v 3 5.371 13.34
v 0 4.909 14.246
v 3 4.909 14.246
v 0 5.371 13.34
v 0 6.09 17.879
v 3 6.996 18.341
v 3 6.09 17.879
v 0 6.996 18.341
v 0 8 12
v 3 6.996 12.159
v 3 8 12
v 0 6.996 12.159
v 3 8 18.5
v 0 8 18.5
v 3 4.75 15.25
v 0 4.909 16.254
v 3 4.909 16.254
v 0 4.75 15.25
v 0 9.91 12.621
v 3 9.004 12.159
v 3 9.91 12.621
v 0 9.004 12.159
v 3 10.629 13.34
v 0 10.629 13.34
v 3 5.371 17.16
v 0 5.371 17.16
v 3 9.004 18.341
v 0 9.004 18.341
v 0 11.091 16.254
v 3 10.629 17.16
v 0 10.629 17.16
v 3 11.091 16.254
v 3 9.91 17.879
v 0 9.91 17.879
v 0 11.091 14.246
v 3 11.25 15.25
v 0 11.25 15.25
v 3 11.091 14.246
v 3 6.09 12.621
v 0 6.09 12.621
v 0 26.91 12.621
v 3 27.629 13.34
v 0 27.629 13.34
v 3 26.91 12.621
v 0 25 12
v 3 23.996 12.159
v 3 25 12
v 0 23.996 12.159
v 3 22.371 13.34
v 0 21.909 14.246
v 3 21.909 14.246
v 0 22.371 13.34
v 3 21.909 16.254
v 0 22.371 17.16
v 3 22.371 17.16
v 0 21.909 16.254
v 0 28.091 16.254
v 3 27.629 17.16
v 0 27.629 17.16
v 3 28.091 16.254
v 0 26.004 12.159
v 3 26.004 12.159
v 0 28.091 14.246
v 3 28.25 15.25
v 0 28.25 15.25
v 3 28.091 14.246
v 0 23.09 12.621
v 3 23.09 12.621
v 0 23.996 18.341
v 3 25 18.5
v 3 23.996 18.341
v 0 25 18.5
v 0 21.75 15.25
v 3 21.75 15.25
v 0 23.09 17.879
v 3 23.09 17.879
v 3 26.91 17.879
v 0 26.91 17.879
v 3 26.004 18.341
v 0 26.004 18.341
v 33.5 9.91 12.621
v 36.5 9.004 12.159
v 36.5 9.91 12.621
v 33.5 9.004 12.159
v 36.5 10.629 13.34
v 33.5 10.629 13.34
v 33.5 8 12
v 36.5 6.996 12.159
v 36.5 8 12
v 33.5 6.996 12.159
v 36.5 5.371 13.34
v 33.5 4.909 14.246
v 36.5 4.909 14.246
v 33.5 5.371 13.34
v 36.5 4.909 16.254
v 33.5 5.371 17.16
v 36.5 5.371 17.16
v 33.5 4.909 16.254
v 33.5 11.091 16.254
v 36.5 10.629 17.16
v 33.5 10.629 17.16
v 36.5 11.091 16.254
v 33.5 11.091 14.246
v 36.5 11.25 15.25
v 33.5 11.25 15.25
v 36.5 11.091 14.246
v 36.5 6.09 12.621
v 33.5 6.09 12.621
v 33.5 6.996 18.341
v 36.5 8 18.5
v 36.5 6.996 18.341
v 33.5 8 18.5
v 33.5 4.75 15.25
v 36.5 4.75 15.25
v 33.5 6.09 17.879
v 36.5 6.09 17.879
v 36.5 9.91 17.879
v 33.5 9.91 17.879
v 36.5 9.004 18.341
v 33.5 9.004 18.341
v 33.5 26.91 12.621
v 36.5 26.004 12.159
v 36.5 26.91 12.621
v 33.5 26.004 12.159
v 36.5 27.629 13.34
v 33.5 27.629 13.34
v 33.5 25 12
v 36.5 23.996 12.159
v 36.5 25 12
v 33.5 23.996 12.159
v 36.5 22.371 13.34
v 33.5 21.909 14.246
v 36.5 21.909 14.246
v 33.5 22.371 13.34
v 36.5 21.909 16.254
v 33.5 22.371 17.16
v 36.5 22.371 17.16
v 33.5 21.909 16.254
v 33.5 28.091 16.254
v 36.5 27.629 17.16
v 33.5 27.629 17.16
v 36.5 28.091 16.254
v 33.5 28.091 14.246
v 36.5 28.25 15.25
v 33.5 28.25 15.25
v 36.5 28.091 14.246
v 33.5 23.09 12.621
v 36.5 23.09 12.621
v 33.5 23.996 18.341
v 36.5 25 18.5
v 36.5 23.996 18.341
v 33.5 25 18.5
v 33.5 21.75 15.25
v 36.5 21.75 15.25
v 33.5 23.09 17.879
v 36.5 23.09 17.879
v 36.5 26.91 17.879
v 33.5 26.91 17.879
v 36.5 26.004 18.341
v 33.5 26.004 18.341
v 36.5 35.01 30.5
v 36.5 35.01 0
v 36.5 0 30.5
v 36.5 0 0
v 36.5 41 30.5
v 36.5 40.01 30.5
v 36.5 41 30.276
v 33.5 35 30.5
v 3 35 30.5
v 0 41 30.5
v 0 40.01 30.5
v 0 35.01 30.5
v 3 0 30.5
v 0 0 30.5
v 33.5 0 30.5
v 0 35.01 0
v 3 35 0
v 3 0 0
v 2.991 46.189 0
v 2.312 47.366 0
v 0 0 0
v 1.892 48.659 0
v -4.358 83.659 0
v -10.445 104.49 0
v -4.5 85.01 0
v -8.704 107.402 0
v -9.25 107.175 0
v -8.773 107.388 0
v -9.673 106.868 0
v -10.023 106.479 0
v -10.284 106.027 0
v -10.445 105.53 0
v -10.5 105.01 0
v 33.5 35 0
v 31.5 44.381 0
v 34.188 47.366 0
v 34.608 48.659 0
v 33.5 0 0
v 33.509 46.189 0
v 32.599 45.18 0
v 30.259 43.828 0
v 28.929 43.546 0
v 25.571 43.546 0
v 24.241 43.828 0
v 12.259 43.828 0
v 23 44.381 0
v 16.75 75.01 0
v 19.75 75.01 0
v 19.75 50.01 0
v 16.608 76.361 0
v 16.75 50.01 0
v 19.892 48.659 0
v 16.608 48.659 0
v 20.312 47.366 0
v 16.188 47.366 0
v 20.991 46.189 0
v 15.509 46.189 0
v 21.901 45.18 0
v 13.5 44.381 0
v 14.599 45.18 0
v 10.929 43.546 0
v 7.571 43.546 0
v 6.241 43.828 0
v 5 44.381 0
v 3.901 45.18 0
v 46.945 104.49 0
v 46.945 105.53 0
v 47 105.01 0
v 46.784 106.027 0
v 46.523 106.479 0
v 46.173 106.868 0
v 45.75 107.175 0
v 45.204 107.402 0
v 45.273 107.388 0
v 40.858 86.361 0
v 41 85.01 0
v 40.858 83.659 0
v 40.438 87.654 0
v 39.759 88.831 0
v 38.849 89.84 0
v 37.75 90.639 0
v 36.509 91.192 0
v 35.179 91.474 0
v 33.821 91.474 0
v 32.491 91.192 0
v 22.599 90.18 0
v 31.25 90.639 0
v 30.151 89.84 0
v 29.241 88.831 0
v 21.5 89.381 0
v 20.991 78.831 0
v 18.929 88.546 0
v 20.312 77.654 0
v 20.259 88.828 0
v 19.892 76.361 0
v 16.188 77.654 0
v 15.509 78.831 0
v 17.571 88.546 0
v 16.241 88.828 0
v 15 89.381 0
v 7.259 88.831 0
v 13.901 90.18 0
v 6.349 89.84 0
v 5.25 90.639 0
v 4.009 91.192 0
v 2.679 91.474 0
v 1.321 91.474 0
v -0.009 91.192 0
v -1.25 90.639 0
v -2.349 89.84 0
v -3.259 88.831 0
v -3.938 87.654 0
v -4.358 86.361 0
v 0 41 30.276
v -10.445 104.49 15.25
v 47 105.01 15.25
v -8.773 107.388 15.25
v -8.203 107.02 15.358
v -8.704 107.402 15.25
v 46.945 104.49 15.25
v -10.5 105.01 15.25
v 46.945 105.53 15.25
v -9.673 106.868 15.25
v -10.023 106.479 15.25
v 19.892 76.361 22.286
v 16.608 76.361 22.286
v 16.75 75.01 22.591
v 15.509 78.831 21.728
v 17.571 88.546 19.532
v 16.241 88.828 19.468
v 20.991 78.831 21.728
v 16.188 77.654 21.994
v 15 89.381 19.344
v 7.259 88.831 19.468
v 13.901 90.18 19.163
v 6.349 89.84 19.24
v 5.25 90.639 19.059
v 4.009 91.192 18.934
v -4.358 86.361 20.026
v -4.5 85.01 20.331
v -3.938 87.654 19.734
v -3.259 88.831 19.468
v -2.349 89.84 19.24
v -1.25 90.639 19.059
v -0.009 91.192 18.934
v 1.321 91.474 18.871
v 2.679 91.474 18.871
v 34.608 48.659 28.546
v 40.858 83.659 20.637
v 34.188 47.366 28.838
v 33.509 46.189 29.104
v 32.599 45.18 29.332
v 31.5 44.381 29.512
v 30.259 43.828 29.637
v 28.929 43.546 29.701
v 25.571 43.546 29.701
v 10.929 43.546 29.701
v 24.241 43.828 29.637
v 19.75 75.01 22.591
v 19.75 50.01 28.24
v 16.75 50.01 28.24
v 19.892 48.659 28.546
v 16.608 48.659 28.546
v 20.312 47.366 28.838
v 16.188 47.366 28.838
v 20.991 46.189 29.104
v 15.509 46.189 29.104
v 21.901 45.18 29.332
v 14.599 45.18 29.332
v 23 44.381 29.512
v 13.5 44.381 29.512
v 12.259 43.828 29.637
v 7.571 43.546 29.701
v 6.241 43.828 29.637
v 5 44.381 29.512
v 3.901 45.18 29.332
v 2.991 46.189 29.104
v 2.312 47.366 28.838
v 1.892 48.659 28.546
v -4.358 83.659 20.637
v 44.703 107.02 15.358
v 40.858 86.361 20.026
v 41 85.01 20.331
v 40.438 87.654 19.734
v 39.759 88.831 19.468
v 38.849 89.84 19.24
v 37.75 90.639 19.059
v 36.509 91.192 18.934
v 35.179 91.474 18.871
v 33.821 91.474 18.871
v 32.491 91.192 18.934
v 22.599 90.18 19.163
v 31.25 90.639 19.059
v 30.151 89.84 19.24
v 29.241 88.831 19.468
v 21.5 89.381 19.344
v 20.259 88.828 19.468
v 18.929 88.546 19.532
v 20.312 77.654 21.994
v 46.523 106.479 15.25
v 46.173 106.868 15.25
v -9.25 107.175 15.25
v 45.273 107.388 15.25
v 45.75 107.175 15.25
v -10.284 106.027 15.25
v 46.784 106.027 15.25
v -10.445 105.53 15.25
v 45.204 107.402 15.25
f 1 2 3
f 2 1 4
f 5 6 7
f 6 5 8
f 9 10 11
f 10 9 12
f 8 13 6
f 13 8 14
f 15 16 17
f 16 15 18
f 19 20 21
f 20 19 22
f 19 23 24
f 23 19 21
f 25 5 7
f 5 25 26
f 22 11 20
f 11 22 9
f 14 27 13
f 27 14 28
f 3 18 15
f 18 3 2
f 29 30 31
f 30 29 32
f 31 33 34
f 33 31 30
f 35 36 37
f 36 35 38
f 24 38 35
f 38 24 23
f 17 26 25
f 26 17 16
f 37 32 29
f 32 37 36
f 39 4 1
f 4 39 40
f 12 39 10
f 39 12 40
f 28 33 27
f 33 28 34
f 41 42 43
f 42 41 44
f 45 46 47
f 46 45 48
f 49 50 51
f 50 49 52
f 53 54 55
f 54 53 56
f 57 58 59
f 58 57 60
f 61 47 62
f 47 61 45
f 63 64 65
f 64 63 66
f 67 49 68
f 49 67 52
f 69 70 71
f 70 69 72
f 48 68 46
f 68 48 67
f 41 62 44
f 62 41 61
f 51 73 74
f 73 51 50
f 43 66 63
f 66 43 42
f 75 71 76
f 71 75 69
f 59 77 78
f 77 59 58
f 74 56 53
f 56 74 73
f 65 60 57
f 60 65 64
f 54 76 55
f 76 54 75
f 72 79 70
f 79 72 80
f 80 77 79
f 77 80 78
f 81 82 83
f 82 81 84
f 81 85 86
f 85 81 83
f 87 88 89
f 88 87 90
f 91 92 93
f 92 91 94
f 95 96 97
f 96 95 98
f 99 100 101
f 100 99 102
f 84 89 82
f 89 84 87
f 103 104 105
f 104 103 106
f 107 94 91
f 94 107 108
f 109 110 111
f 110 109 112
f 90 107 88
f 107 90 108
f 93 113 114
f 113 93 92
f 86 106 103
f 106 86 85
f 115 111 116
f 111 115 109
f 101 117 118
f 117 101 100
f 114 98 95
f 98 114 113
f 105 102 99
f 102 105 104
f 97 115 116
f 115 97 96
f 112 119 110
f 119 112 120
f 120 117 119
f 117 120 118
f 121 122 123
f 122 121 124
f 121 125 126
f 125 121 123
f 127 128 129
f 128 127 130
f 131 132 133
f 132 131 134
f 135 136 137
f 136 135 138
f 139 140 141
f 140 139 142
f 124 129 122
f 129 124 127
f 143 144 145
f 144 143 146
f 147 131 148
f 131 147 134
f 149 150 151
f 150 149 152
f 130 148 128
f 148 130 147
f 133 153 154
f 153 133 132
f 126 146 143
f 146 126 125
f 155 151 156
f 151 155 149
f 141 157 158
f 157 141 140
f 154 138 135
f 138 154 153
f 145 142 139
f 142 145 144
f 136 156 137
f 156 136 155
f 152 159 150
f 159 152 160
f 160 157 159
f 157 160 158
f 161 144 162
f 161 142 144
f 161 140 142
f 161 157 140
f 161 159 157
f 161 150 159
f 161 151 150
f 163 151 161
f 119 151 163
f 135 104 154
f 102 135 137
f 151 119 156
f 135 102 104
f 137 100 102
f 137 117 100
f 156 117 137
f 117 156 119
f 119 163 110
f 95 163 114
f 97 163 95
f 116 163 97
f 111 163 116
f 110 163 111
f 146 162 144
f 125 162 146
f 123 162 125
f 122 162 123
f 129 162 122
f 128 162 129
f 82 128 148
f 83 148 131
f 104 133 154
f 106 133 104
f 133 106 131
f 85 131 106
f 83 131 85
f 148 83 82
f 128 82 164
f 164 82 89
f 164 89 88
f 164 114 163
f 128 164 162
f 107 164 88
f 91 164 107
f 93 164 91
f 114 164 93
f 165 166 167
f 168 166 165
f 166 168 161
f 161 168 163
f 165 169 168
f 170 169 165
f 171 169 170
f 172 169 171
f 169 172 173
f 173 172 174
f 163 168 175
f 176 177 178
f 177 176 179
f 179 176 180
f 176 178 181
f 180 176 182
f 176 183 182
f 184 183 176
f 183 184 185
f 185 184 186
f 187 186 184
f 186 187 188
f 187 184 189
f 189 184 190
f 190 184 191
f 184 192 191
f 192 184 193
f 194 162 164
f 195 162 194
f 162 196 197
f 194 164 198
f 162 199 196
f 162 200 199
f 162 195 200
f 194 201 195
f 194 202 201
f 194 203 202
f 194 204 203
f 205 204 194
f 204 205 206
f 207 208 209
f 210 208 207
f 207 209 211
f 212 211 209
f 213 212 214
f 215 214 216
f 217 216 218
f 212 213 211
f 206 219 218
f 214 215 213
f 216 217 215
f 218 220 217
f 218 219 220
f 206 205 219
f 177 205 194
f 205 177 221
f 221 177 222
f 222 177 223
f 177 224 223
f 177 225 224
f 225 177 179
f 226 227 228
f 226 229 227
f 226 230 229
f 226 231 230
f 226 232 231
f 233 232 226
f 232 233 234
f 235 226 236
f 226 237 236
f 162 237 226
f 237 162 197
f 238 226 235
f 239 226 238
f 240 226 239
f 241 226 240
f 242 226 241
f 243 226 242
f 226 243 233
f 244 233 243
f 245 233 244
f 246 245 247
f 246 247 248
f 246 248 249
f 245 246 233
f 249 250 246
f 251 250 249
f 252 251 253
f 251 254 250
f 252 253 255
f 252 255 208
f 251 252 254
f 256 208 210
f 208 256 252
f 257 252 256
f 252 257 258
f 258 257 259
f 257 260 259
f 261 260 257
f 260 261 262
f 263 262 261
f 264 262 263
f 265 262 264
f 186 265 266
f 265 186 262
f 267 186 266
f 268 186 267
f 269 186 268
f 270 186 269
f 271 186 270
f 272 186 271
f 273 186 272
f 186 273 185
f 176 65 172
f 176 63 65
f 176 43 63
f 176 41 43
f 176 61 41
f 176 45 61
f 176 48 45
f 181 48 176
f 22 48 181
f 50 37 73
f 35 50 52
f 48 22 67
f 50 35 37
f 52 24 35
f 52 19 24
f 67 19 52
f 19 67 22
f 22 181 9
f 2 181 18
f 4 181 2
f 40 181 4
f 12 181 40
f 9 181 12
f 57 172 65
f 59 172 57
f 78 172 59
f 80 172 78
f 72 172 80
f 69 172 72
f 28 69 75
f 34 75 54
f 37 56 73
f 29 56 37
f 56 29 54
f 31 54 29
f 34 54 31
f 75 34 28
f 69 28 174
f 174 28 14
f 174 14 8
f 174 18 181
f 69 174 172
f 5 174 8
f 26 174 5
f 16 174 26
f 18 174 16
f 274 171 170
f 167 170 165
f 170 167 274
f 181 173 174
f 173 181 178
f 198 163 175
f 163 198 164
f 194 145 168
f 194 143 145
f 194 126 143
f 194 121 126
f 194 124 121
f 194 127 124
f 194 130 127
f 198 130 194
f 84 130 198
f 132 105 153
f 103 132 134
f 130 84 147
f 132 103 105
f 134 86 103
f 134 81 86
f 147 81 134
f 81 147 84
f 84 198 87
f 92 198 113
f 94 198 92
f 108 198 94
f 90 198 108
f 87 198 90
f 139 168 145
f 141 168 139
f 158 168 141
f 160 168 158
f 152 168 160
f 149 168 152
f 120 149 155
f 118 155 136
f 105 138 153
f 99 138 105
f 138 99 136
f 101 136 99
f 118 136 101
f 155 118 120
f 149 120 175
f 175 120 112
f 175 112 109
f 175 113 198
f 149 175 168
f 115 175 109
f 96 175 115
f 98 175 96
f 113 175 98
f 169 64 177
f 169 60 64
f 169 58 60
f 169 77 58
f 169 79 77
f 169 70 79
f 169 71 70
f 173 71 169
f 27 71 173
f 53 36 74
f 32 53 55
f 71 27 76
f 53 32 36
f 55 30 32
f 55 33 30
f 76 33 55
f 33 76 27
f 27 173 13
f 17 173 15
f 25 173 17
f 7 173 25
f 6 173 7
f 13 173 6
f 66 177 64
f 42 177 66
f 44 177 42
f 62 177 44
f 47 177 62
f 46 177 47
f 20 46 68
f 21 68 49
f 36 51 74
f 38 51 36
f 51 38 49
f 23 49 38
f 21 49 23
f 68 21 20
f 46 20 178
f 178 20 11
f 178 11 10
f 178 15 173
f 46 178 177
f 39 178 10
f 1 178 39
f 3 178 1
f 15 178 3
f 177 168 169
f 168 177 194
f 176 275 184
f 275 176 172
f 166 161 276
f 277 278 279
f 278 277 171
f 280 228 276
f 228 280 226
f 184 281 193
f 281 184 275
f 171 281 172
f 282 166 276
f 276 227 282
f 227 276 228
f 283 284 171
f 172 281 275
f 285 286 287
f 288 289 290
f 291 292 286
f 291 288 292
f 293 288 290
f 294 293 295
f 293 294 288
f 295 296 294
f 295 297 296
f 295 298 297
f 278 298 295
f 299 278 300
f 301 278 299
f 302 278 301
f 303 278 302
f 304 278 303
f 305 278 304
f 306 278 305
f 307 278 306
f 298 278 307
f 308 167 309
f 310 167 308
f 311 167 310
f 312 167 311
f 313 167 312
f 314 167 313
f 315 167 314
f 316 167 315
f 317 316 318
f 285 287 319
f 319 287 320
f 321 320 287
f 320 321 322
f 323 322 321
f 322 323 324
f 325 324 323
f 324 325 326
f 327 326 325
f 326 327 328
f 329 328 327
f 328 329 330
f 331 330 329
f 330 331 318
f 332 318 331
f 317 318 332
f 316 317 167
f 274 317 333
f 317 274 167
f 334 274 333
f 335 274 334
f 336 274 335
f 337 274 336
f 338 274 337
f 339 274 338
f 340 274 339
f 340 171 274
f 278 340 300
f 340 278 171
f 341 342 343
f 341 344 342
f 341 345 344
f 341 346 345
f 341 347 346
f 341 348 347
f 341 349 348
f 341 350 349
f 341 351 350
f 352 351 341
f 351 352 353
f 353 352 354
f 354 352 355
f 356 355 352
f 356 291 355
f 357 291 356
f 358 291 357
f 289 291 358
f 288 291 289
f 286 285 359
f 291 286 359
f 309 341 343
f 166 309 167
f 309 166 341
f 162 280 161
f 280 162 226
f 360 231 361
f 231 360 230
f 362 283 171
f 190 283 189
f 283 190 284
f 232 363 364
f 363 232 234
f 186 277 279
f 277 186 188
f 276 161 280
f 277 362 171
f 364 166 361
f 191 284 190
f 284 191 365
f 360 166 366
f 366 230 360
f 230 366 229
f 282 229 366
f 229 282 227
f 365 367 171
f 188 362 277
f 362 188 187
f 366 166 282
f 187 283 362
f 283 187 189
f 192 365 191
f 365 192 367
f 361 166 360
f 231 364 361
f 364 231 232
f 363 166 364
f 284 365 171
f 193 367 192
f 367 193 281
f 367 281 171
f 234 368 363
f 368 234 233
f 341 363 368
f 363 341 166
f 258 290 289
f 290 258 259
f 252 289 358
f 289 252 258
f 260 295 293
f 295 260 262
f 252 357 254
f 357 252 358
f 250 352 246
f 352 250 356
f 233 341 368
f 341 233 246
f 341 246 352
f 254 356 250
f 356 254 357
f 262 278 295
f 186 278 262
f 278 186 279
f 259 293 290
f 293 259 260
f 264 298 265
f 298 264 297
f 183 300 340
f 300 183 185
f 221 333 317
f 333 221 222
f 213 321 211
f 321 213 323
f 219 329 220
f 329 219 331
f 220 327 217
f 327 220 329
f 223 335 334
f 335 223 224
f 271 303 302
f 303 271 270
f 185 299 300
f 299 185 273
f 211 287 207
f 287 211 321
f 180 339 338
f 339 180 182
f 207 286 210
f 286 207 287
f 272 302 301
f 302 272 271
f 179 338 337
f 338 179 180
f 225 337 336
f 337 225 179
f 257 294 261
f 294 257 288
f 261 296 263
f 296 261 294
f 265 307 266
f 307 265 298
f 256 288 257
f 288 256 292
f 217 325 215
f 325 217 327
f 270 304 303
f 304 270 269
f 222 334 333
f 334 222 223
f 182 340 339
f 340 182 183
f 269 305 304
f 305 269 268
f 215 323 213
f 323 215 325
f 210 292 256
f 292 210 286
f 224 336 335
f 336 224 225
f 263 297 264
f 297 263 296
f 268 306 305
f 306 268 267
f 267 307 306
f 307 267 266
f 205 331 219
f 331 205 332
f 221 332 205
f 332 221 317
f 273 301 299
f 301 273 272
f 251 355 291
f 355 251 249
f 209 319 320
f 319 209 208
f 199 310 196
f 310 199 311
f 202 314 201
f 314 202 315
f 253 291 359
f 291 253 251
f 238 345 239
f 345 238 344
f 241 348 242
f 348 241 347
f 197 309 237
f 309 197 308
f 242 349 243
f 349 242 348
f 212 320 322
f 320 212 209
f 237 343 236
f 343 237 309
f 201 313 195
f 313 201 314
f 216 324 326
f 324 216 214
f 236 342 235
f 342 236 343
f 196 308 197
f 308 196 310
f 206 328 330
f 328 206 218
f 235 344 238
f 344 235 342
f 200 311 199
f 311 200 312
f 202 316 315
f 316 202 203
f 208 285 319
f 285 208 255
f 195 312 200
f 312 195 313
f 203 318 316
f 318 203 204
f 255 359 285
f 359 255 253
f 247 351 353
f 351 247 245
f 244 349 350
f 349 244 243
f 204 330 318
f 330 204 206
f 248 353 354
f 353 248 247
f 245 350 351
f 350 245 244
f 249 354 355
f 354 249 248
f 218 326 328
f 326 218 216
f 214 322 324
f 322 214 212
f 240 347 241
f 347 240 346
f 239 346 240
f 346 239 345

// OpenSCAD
// file: lib/ALU_profile_holder_top.scad
include <../../parameters.scad>



module ALU_profile_holder_top(deep=35) {
    wall_thickness = ALU_profile_holder_wall_thickness;
    
    module screw_holes() {
        translate([wall_thickness/2, 8, ALU_profile_width/2]) {
            rotate([0, 90, 0]) 
                cylinder(d=M6_screw_diameter, h=wall_thickness*2, center=true, $fn=20);
        }
        translate([wall_thickness/2, deep-10, ALU_profile_width/2]) {
                rotate([0, 90, 0])
                cylinder(d=M6_screw_diameter, h=wall_thickness*2, center=true, $fn=20);
            
        }
    }
    
    difference() {
        cube([ALU_profile_width+wall_thickness*2, deep+wall_thickness*2, ALU_profile_width]);
        translate([wall_thickness, -0.1, -0.1])
            cube([ALU_profile_width, deep+0.1, ALU_profile_width+0.2]);
        
        screw_holes();
        translate([ALU_profile_width+wall_thickness, 0, 0])
            screw_holes();
    }
}

ALU_profile_holder_top(35);
// file: ../parameters.scad
maximum_printable_size = 150;

layer_thickness = 0.3;
global_clearance = 0.5;


//Screw diameter and nut for M10 [mm]
M10_screw_diameter = 10.4;
M10_head_height = 10;
M10_head_diameter = 16+0.5;
M10_nut_height = 10.5;
M10_nut_diameter = 25.5;
M10_nut_pocket = 22.3;

//Screw diameter for M8 [mm]
M8_screw_diameter = 8.6;
M8_head_height = 8;
M8_head_diameter = 13.5;
M8_nut_height = 7.5;
M8_square_nut_thin_height = 4.5;
M8_nut_diameter = 14.4 + 0.5;
M8_nut_pocket = 13 + 0.5;
M8_washer_diameter = 16;
M8_washer_thickness = 1.5;


//Screw diameter and nut for M6 [mm]
M6_screw_diameter=6.5;
M6_head_diameter = 10+0.5;
M6_head_height = 6;
M6_nut_height = 4.9;
M6_nut_diameter = 11.8;
M6_nut_pocket = 10.4;
M6_square_nut_height = 3;
M6_square_nut_diameter = 10;
M6_washer_thickness = 1.6;

//Screw diameter and nut for M5 [mm]
M5_screw_diameter=5.5;
M5_head_height = 5;
M5_head_diameter = 13+0.5;
M5_nut_height = 4.5;
M5_nut_diameter = 9.4;
M5_nut_pocket = 8.4;

//Screw diameter and nut for M4 [mm]
M4_screw_diameter=4.5;
M4_screw_head_height = 4;
M4_nut_height = 3.2;
M4_nut_diameter = 8.4;
M4_nut_pocket = 7.5;

//Screw diameter and nut for M3 [mm]
M3_screw_diameter = 3.2;
M3_nut_height = 2.7;
M3_nut_diameter = 6.6;
M3_nut_pocket = 5.6;
M3_screw_head_height = 3;

//Screw diameter and nut for M2,5 [mm]
M2_5_screw_diameter = 2.7;
M2_5_nut_height = 2.3;
M2_5_nut_diameter = 6;
M2_5_nut_pocket = 5.5;

// kulove lozisko

bearing_efsm_08_h = 33+1;
bearing_efsm_08_m = 22;
bearing_efsm_08_db = 18;
bearing_efsm_08_ag = 10.5;
bearing_efsm_08_n = M4_screw_diameter;
bearing_efsm_08_a1 = 5.5;
bearing_efsm_08_d = 8.25;
bearing_efsm_08_B = 8; // ball height

bearing_efsm_10_h = 38+1;
bearing_efsm_10_m = 26;
bearing_efsm_10_db = 21.9;
bearing_efsm_10_ag = 12+0.2;
bearing_efsm_10_n = M5_screw_diameter;
bearing_efsm_10_a1 = 6.5;
bearing_efsm_10_d = 10.25;


bearing_efsm_12_width = 40+1;
bearing_efsm_12_h = bearing_efsm_12_width;
bearing_efsm_12_boltd = 28/2; // polovina vzdalenosti mezi srouby
bearing_efsm_12_m = bearing_efsm_12_boltd*2;
bearing_efsm_12_db = 25;
bearing_efsm_12_ag = 13;
bearing_efsm_12_a1 = 7;
bearing_efsm_12_n = M5_screw_diameter;
bearing_efsm_12_d = 12.15;
bearing_efsm_12_B = 10; // ball height
bearing_efsm_space = 1;

bearing_efsm_17_width = 54+1;
bearing_efsm_17_h = bearing_efsm_17_width;
bearing_efsm_17_boltd = 38/2; // polovina vzdalenosti mezi srouby
bearing_efsm_17_m = bearing_efsm_17_boltd*2;
bearing_efsm_17_db = 35;
bearing_efsm_17_ag = 18;
bearing_efsm_17_n = M6_screw_diameter;
bearing_efsm_17_a1 = 10;
bearing_efsm_17_B = 17; // ball height

//limcove lozisko
bearing_EFOM_10_L=26; //celkova sirka zakladny
bearing_EFOM_10_d1=10.3;//diametr otvoru real=10 mm
bearing_EFOM_10_dB=22;//diametr vystupku pro ulozeni lozika
bearing_EFOM_10_H=52;//celková delka zakladny
bearing_EFOM_10_J=36;// hole pitch
bearing_EFOM_10_A1=6.5;//vyska pouzdra
bearing_EFOM_10_Ag=12;//celkova vyska
bearing_EFOM_10_N1=5;//sirka otvoru pro sroub
bearing_EFOM_10_N2=8;//delka otvoru pro sroub
bearing_EFOM_10_m=36;//roztec der pro sroub
bearing_EFOM_10_h=9;//vyska lozika


608_bearing_outer_diameter = 22.3;
608_bearing_inner_diameter = 16;
608_bearing_thickness = 7.1;


// 20 KG servo parameters

servo_20kg_axis_offset = 9.375; // jak je osa mimo stredu
servo_20kg_body_x = 42;
servo_20kg_body_y = 21;
servo_20kg_body_z = 40;
servo_20kg_thread_x = 49/2;
servo_20kg_thread_y = 10/2;
servo_20kg_body_below = 10; // jak hluboko je tělo serva pod drzaky na srouby
servo_20kg_below = 25.8; // jak hluboko je páka serva pod drzaky na srouby

servo_20kg_bolt_d = 2.5+0.3;
servo_20kg_nut_d = 5+0.3;


//strain gauge
strain_gauge_width = 12.7;
strain_gauge_length = 75.1;
strain_gauge_screw_distance = 10;

//ALU profile
ALU_profile_width = 30.5;
ALU_profile_holder_wall_thickness = 3;
ALU_profile_groove_width = 8;

//pillow block bearing
//https://www.igus.eu/product/372
//Part no. KSTM-08
KSTM08_screws_distance = 33;         //m
KSTM08_screws_holes_diameter = 4.5;  //d2
KSTM08_flange_thickness = 6;         //h3
KSTM08_case_width = 9;               //C1
KSTM08_case_length = 47;             //a
KSTM08_ball_width = 12;              //B
KSTM08_ball_hole_diameter = 7.85;    //d1


//ložiska pro malý rotor
bearing_outer_diameter = 10.2;    // Rozměr B1 v nákresu s přídavkem na toleranci otvoru
bearing_thickness = 4;        // Rozměr B2 v nákresu
//bearing_shaft_length = 19.5;    // Rozměr B3 v nákresu, Originalni hodnota 19.5
bearing_shaft_length = 20;    // Rozměr B3 v nákresu


//simple platform parameters ////////////////////////////////////////////
front_holder_width = 160;
front_holder_angle = 25;
front_holder_height = 60;
front_holder_offset = 15;
front_holder_height_offset = 75;

// lock moving servo parameters
// static par.
servo_length = 23.1;
servo_width = 12.1;
servo_height = 26.7;
servo_axle_offset = 2.5;
servo_axle_height = 5;
servo_movement_angle = 40;
servo_movement_angle_offset = -10; // angle offset up
servo_force = 0.5; // [N/m] torque of servo

// dynamic par.
servo_arm_length = servo_width/2+ALU_profile_width/2+ALU_profile_holder_wall_thickness;
servo_travel_y = cos(servo_movement_angle)*servo_arm_length;
servo_arm_hole_length = (servo_arm_length/cos(servo_movement_angle+servo_movement_angle_offset))-servo_arm_length;
servo_joint_offset = sin(servo_movement_angle+servo_movement_angle_offset)*(servo_arm_length+servo_arm_hole_length+5);
servo_joint_offset_by_angle = -tan(servo_movement_angle_offset)*servo_arm_length;
servo_max_linear_force = servo_force/(servo_arm_length/1000); // max servo linear force [N]
servo_min_linear_force = cos(servo_movement_angle+abs(servo_movement_angle_offset))*servo_max_linear_force; // min servo linear force [N] in the most extreme position
servo_holding_linear_force = cos(servo_movement_angle+servo_movement_angle_offset)*servo_max_linear_force; // min servo linear force [N] in holding position

// lock static parameters
lock_screws_dia = 3.1;
lock_depth = 20;
lock_axle_diameter = 15;
lock_grab_axle_dia = 13;
lock_arms_joint_offset = 30;
lock_arms_joint_angle = 55;

// lock dynamic parameters
lock_push_force = (servo_holding_linear_force/cos(lock_arms_joint_angle))/cos(lock_arms_joint_angle); // lock arm pushing force on linear servo joint
lock_push_arm_length = tan(lock_arms_joint_angle)*lock_arms_joint_offset;
lock_arm_force_ratio = 1; // lock arm change holding force ratio (0.5 = arm will have half holding force)
lock_hold_arm_length = lock_push_arm_length/lock_arm_force_ratio;
lock_holding_force = lock_push_force*lock_arm_force_ratio;
lock_joint_arm_length = sqrt(pow(lock_push_arm_length, 2)+pow(lock_arms_joint_offset, 2));
// main file
include <../parameters.scad>
use <./lib/ALU_profile_holder_top.scad>



module 888_1001() {
	translate([0, 35.01, 0])
	difference() {
		union() {
			hull() {
				cube([ALU_profile_width+ALU_profile_holder_wall_thickness*2, 5, ALU_profile_width]);

				translate([ALU_profile_width+ALU_profile_holder_wall_thickness*2+8, 70, 0])
				cylinder(d=5, h=ALU_profile_width/2, $fn=30);

				translate([-8, 70, 0])
				cylinder(d=5, h=ALU_profile_width/2, $fn=30);
			}

			translate([0, -35.01, 0])
			ALU_profile_holder_top();
		}
		

		// tube hole
		translate([0, 0, -1])
		hull() {
			translate([ALU_profile_width/2+ALU_profile_holder_wall_thickness, 60, 0])
			cylinder(d=lock_grab_axle_dia, h=ALU_profile_width+2, $fn=30);

			translate([ALU_profile_width+ALU_profile_holder_wall_thickness*2+8, 80, 0])
			cylinder(d=lock_grab_axle_dia, h=ALU_profile_width+2, $fn=30);

			translate([-8, 80, 0])
			cylinder(d=lock_grab_axle_dia, h=ALU_profile_width+2, $fn=30);
		}

		// middle body hole
		translate([0, 0, -1])
		hull() {
			translate([ALU_profile_width/2+ALU_profile_holder_wall_thickness-8, 15, 0])
			cylinder(d=lock_grab_axle_dia, h=ALU_profile_width+2, $fn=30);

			translate([ALU_profile_width/2+ALU_profile_holder_wall_thickness-10, 15, 0])
			cylinder(d=lock_grab_axle_dia, h=ALU_profile_width+2, $fn=30);

			translate([ALU_profile_width/2+ALU_profile_holder_wall_thickness-8, 40, 0])
			cylinder(d=lock_grab_axle_dia, h=ALU_profile_width+2, $fn=30);

			translate([2, 50, 0])

			cylinder(d=lock_grab_axle_dia, h=ALU_profile_width+2, $fn=30);
		}

		mirror([1, 0, 0])
		translate([-ALU_profile_width-ALU_profile_holder_wall_thickness*2, 0, -1])
		hull() {
			translate([ALU_profile_width/2+ALU_profile_holder_wall_thickness-8, 15, 0])
			cylinder(d=lock_grab_axle_dia, h=ALU_profile_width+2, $fn=30);

			translate([ALU_profile_width/2+ALU_profile_holder_wall_thickness-10, 15, 0])
			cylinder(d=lock_grab_axle_dia, h=ALU_profile_width+2, $fn=30);

			translate([ALU_profile_width/2+ALU_profile_holder_wall_thickness-8, 40, 0])
			cylinder(d=lock_grab_axle_dia, h=ALU_profile_width+2, $fn=30);

			translate([2, 50, 0])
			cylinder(d=lock_grab_axle_dia, h=ALU_profile_width+2, $fn=30);
		}
	}
}

888_1001();
